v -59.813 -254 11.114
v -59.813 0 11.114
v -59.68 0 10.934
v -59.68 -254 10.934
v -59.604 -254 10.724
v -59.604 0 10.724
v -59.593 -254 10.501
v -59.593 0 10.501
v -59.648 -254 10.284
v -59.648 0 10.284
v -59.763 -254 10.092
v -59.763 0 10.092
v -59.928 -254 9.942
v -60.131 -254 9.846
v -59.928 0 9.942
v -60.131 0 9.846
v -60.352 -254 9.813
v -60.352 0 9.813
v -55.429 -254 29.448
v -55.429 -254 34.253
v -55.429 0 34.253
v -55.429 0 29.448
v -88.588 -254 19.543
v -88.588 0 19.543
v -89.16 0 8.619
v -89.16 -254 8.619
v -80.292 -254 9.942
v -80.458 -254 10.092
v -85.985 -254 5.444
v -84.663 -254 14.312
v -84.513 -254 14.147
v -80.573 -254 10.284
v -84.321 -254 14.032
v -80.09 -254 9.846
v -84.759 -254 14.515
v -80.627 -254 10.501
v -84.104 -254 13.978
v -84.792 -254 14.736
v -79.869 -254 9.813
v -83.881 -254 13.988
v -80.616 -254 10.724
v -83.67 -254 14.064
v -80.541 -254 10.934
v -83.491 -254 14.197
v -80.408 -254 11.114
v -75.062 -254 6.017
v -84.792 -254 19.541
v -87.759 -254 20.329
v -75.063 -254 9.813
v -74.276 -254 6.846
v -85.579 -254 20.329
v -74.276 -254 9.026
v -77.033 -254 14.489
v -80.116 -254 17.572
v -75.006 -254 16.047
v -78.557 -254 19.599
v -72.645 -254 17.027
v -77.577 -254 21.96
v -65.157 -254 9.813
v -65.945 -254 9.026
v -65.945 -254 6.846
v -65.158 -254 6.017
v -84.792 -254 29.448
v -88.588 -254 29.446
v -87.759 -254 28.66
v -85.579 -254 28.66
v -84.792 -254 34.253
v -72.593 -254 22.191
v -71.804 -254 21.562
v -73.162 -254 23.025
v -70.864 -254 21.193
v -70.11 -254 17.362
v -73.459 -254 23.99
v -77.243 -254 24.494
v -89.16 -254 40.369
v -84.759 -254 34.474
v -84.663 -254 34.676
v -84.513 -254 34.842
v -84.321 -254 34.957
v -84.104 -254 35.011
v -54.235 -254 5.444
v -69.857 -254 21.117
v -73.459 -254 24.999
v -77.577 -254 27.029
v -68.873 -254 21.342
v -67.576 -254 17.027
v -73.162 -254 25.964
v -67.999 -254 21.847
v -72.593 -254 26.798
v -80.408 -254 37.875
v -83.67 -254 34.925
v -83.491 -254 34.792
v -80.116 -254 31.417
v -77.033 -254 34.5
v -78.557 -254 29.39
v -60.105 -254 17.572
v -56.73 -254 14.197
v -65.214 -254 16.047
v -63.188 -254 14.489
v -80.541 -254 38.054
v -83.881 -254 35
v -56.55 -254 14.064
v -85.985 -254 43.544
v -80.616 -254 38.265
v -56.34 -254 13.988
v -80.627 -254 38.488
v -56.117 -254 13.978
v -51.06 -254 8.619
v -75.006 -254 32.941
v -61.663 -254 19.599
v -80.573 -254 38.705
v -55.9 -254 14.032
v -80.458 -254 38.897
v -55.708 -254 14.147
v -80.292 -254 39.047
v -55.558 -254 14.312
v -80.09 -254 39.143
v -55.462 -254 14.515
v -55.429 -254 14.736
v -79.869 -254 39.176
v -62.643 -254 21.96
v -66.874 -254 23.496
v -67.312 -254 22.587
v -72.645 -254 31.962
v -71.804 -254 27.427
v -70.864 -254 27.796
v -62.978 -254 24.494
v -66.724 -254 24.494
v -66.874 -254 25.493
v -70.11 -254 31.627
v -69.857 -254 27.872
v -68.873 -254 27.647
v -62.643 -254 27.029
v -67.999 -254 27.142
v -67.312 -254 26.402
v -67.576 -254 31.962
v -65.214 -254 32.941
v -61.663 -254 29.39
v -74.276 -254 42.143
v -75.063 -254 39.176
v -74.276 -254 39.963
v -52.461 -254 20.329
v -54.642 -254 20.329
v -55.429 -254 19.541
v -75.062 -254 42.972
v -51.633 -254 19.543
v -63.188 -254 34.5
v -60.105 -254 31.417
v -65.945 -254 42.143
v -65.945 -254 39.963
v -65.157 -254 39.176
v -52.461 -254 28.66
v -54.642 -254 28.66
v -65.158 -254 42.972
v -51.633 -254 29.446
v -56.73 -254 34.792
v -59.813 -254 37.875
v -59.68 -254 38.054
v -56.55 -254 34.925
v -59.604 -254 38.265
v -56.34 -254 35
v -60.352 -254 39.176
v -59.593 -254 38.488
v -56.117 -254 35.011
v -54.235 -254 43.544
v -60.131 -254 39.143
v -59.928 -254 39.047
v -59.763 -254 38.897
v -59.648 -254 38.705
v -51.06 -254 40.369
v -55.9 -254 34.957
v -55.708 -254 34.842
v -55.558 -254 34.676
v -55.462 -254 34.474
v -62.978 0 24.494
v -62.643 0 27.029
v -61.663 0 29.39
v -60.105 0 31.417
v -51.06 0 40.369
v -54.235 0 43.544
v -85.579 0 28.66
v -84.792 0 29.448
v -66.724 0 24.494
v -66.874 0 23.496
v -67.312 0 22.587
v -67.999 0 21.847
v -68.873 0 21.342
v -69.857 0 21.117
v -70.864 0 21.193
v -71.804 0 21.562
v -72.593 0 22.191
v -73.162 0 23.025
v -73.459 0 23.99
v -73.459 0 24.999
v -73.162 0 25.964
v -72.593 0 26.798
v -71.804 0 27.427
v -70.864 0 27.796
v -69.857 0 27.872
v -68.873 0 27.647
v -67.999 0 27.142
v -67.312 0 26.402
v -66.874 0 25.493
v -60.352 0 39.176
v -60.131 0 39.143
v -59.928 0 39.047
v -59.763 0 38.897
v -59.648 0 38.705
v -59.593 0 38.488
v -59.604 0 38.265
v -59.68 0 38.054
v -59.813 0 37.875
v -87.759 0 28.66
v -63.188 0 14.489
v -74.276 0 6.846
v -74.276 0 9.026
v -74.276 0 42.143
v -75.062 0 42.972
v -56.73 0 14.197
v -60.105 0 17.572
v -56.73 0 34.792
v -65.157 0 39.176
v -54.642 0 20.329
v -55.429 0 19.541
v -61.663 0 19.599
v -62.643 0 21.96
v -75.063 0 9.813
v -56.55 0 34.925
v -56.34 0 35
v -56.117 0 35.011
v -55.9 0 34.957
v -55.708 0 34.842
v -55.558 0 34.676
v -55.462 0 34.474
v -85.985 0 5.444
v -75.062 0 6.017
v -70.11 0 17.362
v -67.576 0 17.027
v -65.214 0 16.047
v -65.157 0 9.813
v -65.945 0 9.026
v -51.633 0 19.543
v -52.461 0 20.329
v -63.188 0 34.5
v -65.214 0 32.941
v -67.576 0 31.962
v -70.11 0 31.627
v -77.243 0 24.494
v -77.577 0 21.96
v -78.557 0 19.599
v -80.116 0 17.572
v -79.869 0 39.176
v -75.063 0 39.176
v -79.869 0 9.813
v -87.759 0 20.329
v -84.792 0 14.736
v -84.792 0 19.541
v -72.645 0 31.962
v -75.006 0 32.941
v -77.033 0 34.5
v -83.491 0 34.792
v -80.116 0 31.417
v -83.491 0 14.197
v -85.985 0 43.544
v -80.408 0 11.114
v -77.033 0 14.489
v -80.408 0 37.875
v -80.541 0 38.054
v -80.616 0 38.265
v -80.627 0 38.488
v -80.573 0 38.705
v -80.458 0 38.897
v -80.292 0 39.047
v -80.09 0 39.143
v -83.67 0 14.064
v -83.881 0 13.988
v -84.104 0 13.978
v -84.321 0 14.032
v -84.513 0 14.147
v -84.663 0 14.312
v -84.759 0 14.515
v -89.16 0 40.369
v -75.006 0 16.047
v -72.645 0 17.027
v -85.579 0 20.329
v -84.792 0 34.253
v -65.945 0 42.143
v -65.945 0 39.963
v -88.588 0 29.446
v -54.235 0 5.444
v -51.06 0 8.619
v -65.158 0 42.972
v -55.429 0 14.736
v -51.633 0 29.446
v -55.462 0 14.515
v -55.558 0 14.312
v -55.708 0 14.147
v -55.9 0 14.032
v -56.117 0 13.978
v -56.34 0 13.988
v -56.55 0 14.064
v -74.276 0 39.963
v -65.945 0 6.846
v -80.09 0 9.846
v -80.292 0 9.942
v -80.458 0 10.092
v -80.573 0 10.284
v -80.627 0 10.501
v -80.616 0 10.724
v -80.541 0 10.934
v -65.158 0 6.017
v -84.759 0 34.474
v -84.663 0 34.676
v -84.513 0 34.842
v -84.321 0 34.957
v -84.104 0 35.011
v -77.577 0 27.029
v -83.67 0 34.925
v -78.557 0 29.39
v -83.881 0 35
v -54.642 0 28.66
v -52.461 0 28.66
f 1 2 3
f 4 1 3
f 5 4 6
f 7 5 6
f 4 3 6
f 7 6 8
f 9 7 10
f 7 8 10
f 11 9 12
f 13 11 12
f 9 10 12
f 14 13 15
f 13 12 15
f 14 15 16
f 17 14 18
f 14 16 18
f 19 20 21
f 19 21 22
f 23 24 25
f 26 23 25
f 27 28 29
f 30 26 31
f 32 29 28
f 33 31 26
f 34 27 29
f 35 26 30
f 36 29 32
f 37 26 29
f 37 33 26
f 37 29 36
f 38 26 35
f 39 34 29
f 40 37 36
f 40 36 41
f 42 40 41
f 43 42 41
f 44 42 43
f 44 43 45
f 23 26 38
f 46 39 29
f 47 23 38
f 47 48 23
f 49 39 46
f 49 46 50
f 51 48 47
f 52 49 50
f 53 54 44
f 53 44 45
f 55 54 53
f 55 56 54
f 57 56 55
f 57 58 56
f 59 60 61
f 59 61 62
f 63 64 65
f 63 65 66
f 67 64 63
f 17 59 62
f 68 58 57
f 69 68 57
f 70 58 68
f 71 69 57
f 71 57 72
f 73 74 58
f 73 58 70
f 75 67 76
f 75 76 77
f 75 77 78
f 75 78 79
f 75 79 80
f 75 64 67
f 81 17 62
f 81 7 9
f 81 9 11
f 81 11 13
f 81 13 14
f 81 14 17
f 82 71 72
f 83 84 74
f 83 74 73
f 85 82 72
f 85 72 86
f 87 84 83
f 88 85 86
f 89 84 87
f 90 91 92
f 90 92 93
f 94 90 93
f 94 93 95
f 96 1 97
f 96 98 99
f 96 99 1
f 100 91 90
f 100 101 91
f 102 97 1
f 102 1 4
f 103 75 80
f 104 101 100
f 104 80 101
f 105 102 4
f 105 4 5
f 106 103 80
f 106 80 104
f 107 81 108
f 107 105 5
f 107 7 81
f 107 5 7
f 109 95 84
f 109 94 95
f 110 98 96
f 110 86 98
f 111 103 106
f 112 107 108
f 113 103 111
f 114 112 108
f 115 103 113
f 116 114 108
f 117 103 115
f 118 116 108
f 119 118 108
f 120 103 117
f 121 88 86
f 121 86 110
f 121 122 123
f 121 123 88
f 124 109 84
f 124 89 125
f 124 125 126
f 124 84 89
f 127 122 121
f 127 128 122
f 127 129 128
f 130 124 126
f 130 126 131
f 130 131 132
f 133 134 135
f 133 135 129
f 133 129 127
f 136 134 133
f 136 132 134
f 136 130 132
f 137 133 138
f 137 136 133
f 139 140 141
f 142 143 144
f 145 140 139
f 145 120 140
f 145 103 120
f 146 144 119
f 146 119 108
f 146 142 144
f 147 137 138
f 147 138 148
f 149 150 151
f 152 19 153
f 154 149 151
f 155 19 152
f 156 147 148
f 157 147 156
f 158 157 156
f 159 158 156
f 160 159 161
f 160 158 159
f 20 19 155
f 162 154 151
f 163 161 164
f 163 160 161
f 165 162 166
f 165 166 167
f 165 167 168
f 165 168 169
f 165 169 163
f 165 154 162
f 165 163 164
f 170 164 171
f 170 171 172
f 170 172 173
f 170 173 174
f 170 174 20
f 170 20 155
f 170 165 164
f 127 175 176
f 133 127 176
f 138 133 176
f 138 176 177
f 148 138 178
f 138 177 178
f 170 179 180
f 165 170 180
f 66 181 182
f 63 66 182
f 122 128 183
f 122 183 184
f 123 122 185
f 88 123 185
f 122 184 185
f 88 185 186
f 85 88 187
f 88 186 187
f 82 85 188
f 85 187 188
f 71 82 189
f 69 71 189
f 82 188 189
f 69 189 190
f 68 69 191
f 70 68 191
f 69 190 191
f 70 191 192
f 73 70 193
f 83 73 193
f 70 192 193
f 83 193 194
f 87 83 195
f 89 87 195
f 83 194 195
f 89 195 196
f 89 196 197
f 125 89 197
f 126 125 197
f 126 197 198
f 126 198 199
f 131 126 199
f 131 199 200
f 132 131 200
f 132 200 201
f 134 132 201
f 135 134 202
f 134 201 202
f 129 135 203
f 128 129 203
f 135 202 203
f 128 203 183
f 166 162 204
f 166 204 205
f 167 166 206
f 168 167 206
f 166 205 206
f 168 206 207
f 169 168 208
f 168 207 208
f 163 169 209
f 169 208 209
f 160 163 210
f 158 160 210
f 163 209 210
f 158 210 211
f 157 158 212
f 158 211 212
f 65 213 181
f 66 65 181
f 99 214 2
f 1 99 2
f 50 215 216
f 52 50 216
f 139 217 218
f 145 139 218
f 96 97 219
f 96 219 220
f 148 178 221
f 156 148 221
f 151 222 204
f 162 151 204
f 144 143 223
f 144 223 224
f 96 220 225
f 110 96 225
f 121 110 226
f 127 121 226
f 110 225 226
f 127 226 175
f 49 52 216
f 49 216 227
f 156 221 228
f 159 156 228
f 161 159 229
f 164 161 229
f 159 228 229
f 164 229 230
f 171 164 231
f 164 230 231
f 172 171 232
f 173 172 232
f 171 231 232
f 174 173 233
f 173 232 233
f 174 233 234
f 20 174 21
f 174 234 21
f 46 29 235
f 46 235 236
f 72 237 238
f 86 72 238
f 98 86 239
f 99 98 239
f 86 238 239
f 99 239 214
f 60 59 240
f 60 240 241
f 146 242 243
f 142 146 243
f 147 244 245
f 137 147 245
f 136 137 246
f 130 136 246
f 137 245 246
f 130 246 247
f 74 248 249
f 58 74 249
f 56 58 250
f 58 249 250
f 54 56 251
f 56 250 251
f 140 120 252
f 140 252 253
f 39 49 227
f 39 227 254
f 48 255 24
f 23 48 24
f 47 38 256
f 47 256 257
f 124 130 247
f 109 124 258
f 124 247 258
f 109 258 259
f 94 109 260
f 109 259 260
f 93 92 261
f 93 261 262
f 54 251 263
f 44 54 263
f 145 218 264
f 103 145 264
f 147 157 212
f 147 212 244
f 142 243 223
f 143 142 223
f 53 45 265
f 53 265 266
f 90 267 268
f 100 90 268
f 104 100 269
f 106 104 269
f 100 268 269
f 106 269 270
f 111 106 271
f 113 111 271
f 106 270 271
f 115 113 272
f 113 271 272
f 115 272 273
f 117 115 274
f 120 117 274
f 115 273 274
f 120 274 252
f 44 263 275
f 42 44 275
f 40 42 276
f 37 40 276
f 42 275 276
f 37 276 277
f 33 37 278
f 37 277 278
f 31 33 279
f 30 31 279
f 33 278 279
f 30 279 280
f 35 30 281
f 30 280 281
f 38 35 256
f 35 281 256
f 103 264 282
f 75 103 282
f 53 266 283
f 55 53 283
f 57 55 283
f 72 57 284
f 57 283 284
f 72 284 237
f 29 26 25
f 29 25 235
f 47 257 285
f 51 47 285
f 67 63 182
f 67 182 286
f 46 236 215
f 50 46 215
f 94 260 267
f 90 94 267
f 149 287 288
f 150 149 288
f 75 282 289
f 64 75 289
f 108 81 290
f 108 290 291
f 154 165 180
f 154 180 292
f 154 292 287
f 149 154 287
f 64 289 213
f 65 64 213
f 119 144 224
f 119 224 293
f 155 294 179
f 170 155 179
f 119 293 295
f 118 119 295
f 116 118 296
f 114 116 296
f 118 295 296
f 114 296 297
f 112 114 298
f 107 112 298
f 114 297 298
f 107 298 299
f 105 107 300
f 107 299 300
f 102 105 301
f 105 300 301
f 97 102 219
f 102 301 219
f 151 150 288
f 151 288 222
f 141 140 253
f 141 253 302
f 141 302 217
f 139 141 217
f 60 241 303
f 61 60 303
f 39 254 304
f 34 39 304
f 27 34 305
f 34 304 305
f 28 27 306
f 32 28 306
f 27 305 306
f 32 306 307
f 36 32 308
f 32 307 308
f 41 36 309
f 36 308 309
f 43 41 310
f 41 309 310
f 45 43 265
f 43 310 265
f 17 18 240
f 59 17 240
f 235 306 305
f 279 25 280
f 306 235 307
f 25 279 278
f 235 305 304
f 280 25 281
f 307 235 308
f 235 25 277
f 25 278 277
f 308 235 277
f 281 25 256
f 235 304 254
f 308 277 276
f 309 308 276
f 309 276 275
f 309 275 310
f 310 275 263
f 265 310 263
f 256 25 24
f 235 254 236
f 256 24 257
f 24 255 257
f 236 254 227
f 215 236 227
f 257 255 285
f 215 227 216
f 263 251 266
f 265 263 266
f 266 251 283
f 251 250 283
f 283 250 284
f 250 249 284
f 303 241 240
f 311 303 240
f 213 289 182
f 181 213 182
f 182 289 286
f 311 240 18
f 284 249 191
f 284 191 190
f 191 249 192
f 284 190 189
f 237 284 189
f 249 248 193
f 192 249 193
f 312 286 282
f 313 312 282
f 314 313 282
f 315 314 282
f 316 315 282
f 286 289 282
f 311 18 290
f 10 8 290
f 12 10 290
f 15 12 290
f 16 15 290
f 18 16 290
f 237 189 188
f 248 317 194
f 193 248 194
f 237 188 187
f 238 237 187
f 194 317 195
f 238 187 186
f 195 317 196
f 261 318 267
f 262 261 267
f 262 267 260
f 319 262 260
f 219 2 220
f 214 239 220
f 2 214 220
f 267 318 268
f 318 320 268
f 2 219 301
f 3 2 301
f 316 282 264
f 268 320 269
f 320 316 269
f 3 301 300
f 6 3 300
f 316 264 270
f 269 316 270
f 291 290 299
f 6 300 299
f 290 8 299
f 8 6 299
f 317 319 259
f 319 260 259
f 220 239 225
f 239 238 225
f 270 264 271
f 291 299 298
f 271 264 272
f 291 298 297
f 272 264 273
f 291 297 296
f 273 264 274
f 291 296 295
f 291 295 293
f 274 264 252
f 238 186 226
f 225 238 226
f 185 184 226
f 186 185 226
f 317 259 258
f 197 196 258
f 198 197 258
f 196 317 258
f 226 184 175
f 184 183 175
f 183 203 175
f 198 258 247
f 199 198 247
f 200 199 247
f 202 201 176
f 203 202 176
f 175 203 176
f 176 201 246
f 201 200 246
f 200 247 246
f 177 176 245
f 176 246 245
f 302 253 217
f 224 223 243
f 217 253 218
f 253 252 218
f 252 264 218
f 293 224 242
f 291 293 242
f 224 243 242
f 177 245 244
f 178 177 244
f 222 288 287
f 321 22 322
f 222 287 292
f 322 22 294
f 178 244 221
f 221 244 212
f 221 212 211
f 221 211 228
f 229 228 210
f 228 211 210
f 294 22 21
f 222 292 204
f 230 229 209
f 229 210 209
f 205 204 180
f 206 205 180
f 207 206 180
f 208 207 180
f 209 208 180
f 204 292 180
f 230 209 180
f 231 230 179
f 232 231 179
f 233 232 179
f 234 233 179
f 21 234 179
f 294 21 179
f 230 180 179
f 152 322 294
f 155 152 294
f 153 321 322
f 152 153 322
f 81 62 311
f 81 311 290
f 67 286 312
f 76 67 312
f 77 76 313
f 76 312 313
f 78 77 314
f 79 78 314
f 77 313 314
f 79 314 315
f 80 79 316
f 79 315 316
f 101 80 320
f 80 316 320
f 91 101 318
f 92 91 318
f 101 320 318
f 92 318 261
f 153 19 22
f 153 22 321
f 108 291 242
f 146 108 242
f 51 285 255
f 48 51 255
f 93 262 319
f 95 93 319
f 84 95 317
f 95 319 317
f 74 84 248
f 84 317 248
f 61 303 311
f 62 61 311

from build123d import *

# Parameters (mm, degrees)
F1_DEPTH = 254


# Not quite as in the source:
# - ends of sketch curves that miss each other by under 0.0002 mm in the source are joined


with BuildPart() as f1:
    # F0 (on Front) → F1 (new body)
    with BuildSketch(Plane.XZ):
        with BuildLine():
            Line((-51.0604008, 40.36949), (-54.2354008, 43.5444646))
            Line((-54.2354008, 43.5444646), (-65.158493, 42.9719994))
            Line((-65.158493, 42.9719994), (-65.9448008, 42.1434006))
            Line((-65.9448008, 42.1434006), (-65.9448008, 39.9630646))
            Line((-65.9448008, 39.9630646), (-65.1573754, 39.17569))
            Line((-65.1573754, 39.17569), (-60.3517716, 39.17569))
            ThreePointArc((-60.3517716, 39.17569), (-59.6477719597, 38.7052864789), (-59.8129689327, 37.8748619331))
            Line((-59.8129689327, 37.8748619331), (-63.1878848, 34.4999818))
            ThreePointArc((-63.1878848, 34.4999818), (-66.3629880966, 32.3740308419), (-70.1104008, 31.6271402404))
            ThreePointArc((-70.1104008, 31.6271402404), (-73.8578286035, 32.3740244671), (-77.0329470659, 34.4999769462))
            Line((-77.0329470659, 34.4999769462), (-80.4078656, 37.8748544))
            ThreePointArc((-80.4078656, 37.8748544), (-80.5730550403, 38.7052864789), (-79.8690554, 39.17569))
            Line((-79.8690554, 39.17569), (-75.0634516, 39.17569))
            Line((-75.0634516, 39.17569), (-74.2760262, 39.9630646))
            Line((-74.2760262, 39.9630646), (-74.2760262, 42.1434006))
            Line((-74.2760262, 42.1434006), (-75.062334, 42.9719994))
            Line((-75.062334, 42.9719994), (-85.9854008, 43.5444646))
            Line((-85.9854008, 43.5444646), (-89.1604008, 40.36949))
            Line((-89.1604008, 40.36949), (-88.5879356, 29.4463978))
            Line((-88.5879356, 29.4463978), (-87.7593368, 28.66009))
            Line((-87.7593368, 28.66009), (-85.5790008, 28.66009))
            Line((-85.5790008, 28.66009), (-84.7916262, 29.4475154))
            Line((-84.7916262, 29.4475154), (-84.7916262, 34.2531192))
            ThreePointArc((-84.7916262, 34.2531192), (-84.3212226789, 34.9571188403), (-83.4907981331, 34.7919218673))
            Line((-83.4907981331, 34.7919218673), (-80.115918, 31.417006))
            ThreePointArc((-80.115918, 31.417006), (-77.9899670419, 28.2419027034), (-77.2430764404, 24.49449))
            ThreePointArc((-77.2430764404, 24.49449), (-77.9899606671, 20.7470621965), (-80.1159131462, 17.5719437341))
            Line((-80.1159131462, 17.5719437341), (-83.4907906, 14.1970252))
            ThreePointArc((-83.4907906, 14.1970252), (-84.3212226789, 14.0318357597), (-84.7916262, 14.7358354))
            Line((-84.7916262, 14.7358354), (-84.7916262, 19.5414392))
            Line((-84.7916262, 19.5414392), (-85.5790008, 20.3288646))
            Line((-85.5790008, 20.3288646), (-87.7593368, 20.3288646))
            Line((-87.7593368, 20.3288646), (-88.5879864, 19.5425314))
            Line((-88.5879864, 19.5425314), (-89.1604262, 8.61949))
            Line((-89.1604262, 8.61949), (-85.9854262, 5.44449))
            Line((-85.9854262, 5.44449), (-75.062334, 6.0169552))
            Line((-75.062334, 6.0169552), (-74.2760262, 6.845554))
            Line((-74.2760262, 6.845554), (-74.2760262, 9.02589))
            Line((-74.2760262, 9.02589), (-75.0634516, 9.8132646))
            Line((-75.0634516, 9.8132646), (-79.8690554, 9.8132646))
            ThreePointArc((-79.8690554, 9.8132646), (-80.5730550403, 10.2836681211), (-80.4078580673, 11.1140926669))
            Line((-80.4078580673, 11.1140926669), (-77.0329422, 14.4889728))
            ThreePointArc((-77.0329422, 14.4889728), (-73.8578286035, 16.6149301329), (-70.1104008, 17.3618143619))
            ThreePointArc((-70.1104008, 17.3618143619), (-66.3629880966, 16.6149237581), (-63.187885217, 14.488972384))
            Line((-63.187885217, 14.488972384), (-59.8129614, 11.1141002))
            ThreePointArc((-59.8129614, 11.1141002), (-59.6477719597, 10.2836681211), (-60.3517716, 9.8132646))
            Line((-60.3517716, 9.8132646), (-65.1573754, 9.8132646))
            Line((-65.1573754, 9.8132646), (-65.9448008, 9.02589))
            Line((-65.9448008, 9.02589), (-65.9448008, 6.845554))
            Line((-65.9448008, 6.845554), (-65.158493, 6.0169552))
            Line((-65.158493, 6.0169552), (-54.2354008, 5.44449))
            Line((-54.2354008, 5.44449), (-51.0604008, 8.61949))
            Line((-51.0604008, 8.61949), (-51.6328406, 19.5425314))
            Line((-51.6328406, 19.5425314), (-52.4614902, 20.3288646))
            Line((-52.4614902, 20.3288646), (-54.6418262, 20.3288646))
            Line((-54.6418262, 20.3288646), (-55.4292008, 19.5414392))
            Line((-55.4292008, 19.5414392), (-55.4292008, 14.7358354))
            ThreePointArc((-55.4292008, 14.7358354), (-55.8996043211, 14.0318357597), (-56.7300288669, 14.1970327327))
            Line((-56.7300288669, 14.1970327327), (-60.104909, 17.5719486))
            ThreePointArc((-60.104909, 17.5719486), (-62.2308663329, 20.7470621965), (-62.9777505619, 24.49449))
            ThreePointArc((-62.9777505619, 24.49449), (-62.2308599581, 28.2419027034), (-60.104908584, 31.417005583))
            Line((-60.104908584, 31.417005583), (-56.7300364, 34.7919294))
            ThreePointArc((-56.7300364, 34.7919294), (-55.8996043211, 34.9571188403), (-55.4292008, 34.2531192))
            Line((-55.4292008, 34.2531192), (-55.4292008, 29.4475154))
            Line((-55.4292008, 29.4475154), (-54.6418262, 28.66009))
            Line((-54.6418262, 28.66009), (-52.4614902, 28.66009))
            Line((-52.4614902, 28.66009), (-51.6328406, 29.4464232))
            Line((-51.6328406, 29.4464232), (-51.0604008, 40.36949))
        make_face()
        with BuildLine():
            ThreePointArc((-73.497059, 24.49449), (-70.1104008, 27.8811482), (-66.7237426, 24.49449))
            ThreePointArc((-66.7237426, 24.49449), (-70.1104008, 21.1078318), (-73.497059, 24.49449))
        make_face(mode=Mode.SUBTRACT)
    extrude(amount=F1_DEPTH)


solid = f1.part
